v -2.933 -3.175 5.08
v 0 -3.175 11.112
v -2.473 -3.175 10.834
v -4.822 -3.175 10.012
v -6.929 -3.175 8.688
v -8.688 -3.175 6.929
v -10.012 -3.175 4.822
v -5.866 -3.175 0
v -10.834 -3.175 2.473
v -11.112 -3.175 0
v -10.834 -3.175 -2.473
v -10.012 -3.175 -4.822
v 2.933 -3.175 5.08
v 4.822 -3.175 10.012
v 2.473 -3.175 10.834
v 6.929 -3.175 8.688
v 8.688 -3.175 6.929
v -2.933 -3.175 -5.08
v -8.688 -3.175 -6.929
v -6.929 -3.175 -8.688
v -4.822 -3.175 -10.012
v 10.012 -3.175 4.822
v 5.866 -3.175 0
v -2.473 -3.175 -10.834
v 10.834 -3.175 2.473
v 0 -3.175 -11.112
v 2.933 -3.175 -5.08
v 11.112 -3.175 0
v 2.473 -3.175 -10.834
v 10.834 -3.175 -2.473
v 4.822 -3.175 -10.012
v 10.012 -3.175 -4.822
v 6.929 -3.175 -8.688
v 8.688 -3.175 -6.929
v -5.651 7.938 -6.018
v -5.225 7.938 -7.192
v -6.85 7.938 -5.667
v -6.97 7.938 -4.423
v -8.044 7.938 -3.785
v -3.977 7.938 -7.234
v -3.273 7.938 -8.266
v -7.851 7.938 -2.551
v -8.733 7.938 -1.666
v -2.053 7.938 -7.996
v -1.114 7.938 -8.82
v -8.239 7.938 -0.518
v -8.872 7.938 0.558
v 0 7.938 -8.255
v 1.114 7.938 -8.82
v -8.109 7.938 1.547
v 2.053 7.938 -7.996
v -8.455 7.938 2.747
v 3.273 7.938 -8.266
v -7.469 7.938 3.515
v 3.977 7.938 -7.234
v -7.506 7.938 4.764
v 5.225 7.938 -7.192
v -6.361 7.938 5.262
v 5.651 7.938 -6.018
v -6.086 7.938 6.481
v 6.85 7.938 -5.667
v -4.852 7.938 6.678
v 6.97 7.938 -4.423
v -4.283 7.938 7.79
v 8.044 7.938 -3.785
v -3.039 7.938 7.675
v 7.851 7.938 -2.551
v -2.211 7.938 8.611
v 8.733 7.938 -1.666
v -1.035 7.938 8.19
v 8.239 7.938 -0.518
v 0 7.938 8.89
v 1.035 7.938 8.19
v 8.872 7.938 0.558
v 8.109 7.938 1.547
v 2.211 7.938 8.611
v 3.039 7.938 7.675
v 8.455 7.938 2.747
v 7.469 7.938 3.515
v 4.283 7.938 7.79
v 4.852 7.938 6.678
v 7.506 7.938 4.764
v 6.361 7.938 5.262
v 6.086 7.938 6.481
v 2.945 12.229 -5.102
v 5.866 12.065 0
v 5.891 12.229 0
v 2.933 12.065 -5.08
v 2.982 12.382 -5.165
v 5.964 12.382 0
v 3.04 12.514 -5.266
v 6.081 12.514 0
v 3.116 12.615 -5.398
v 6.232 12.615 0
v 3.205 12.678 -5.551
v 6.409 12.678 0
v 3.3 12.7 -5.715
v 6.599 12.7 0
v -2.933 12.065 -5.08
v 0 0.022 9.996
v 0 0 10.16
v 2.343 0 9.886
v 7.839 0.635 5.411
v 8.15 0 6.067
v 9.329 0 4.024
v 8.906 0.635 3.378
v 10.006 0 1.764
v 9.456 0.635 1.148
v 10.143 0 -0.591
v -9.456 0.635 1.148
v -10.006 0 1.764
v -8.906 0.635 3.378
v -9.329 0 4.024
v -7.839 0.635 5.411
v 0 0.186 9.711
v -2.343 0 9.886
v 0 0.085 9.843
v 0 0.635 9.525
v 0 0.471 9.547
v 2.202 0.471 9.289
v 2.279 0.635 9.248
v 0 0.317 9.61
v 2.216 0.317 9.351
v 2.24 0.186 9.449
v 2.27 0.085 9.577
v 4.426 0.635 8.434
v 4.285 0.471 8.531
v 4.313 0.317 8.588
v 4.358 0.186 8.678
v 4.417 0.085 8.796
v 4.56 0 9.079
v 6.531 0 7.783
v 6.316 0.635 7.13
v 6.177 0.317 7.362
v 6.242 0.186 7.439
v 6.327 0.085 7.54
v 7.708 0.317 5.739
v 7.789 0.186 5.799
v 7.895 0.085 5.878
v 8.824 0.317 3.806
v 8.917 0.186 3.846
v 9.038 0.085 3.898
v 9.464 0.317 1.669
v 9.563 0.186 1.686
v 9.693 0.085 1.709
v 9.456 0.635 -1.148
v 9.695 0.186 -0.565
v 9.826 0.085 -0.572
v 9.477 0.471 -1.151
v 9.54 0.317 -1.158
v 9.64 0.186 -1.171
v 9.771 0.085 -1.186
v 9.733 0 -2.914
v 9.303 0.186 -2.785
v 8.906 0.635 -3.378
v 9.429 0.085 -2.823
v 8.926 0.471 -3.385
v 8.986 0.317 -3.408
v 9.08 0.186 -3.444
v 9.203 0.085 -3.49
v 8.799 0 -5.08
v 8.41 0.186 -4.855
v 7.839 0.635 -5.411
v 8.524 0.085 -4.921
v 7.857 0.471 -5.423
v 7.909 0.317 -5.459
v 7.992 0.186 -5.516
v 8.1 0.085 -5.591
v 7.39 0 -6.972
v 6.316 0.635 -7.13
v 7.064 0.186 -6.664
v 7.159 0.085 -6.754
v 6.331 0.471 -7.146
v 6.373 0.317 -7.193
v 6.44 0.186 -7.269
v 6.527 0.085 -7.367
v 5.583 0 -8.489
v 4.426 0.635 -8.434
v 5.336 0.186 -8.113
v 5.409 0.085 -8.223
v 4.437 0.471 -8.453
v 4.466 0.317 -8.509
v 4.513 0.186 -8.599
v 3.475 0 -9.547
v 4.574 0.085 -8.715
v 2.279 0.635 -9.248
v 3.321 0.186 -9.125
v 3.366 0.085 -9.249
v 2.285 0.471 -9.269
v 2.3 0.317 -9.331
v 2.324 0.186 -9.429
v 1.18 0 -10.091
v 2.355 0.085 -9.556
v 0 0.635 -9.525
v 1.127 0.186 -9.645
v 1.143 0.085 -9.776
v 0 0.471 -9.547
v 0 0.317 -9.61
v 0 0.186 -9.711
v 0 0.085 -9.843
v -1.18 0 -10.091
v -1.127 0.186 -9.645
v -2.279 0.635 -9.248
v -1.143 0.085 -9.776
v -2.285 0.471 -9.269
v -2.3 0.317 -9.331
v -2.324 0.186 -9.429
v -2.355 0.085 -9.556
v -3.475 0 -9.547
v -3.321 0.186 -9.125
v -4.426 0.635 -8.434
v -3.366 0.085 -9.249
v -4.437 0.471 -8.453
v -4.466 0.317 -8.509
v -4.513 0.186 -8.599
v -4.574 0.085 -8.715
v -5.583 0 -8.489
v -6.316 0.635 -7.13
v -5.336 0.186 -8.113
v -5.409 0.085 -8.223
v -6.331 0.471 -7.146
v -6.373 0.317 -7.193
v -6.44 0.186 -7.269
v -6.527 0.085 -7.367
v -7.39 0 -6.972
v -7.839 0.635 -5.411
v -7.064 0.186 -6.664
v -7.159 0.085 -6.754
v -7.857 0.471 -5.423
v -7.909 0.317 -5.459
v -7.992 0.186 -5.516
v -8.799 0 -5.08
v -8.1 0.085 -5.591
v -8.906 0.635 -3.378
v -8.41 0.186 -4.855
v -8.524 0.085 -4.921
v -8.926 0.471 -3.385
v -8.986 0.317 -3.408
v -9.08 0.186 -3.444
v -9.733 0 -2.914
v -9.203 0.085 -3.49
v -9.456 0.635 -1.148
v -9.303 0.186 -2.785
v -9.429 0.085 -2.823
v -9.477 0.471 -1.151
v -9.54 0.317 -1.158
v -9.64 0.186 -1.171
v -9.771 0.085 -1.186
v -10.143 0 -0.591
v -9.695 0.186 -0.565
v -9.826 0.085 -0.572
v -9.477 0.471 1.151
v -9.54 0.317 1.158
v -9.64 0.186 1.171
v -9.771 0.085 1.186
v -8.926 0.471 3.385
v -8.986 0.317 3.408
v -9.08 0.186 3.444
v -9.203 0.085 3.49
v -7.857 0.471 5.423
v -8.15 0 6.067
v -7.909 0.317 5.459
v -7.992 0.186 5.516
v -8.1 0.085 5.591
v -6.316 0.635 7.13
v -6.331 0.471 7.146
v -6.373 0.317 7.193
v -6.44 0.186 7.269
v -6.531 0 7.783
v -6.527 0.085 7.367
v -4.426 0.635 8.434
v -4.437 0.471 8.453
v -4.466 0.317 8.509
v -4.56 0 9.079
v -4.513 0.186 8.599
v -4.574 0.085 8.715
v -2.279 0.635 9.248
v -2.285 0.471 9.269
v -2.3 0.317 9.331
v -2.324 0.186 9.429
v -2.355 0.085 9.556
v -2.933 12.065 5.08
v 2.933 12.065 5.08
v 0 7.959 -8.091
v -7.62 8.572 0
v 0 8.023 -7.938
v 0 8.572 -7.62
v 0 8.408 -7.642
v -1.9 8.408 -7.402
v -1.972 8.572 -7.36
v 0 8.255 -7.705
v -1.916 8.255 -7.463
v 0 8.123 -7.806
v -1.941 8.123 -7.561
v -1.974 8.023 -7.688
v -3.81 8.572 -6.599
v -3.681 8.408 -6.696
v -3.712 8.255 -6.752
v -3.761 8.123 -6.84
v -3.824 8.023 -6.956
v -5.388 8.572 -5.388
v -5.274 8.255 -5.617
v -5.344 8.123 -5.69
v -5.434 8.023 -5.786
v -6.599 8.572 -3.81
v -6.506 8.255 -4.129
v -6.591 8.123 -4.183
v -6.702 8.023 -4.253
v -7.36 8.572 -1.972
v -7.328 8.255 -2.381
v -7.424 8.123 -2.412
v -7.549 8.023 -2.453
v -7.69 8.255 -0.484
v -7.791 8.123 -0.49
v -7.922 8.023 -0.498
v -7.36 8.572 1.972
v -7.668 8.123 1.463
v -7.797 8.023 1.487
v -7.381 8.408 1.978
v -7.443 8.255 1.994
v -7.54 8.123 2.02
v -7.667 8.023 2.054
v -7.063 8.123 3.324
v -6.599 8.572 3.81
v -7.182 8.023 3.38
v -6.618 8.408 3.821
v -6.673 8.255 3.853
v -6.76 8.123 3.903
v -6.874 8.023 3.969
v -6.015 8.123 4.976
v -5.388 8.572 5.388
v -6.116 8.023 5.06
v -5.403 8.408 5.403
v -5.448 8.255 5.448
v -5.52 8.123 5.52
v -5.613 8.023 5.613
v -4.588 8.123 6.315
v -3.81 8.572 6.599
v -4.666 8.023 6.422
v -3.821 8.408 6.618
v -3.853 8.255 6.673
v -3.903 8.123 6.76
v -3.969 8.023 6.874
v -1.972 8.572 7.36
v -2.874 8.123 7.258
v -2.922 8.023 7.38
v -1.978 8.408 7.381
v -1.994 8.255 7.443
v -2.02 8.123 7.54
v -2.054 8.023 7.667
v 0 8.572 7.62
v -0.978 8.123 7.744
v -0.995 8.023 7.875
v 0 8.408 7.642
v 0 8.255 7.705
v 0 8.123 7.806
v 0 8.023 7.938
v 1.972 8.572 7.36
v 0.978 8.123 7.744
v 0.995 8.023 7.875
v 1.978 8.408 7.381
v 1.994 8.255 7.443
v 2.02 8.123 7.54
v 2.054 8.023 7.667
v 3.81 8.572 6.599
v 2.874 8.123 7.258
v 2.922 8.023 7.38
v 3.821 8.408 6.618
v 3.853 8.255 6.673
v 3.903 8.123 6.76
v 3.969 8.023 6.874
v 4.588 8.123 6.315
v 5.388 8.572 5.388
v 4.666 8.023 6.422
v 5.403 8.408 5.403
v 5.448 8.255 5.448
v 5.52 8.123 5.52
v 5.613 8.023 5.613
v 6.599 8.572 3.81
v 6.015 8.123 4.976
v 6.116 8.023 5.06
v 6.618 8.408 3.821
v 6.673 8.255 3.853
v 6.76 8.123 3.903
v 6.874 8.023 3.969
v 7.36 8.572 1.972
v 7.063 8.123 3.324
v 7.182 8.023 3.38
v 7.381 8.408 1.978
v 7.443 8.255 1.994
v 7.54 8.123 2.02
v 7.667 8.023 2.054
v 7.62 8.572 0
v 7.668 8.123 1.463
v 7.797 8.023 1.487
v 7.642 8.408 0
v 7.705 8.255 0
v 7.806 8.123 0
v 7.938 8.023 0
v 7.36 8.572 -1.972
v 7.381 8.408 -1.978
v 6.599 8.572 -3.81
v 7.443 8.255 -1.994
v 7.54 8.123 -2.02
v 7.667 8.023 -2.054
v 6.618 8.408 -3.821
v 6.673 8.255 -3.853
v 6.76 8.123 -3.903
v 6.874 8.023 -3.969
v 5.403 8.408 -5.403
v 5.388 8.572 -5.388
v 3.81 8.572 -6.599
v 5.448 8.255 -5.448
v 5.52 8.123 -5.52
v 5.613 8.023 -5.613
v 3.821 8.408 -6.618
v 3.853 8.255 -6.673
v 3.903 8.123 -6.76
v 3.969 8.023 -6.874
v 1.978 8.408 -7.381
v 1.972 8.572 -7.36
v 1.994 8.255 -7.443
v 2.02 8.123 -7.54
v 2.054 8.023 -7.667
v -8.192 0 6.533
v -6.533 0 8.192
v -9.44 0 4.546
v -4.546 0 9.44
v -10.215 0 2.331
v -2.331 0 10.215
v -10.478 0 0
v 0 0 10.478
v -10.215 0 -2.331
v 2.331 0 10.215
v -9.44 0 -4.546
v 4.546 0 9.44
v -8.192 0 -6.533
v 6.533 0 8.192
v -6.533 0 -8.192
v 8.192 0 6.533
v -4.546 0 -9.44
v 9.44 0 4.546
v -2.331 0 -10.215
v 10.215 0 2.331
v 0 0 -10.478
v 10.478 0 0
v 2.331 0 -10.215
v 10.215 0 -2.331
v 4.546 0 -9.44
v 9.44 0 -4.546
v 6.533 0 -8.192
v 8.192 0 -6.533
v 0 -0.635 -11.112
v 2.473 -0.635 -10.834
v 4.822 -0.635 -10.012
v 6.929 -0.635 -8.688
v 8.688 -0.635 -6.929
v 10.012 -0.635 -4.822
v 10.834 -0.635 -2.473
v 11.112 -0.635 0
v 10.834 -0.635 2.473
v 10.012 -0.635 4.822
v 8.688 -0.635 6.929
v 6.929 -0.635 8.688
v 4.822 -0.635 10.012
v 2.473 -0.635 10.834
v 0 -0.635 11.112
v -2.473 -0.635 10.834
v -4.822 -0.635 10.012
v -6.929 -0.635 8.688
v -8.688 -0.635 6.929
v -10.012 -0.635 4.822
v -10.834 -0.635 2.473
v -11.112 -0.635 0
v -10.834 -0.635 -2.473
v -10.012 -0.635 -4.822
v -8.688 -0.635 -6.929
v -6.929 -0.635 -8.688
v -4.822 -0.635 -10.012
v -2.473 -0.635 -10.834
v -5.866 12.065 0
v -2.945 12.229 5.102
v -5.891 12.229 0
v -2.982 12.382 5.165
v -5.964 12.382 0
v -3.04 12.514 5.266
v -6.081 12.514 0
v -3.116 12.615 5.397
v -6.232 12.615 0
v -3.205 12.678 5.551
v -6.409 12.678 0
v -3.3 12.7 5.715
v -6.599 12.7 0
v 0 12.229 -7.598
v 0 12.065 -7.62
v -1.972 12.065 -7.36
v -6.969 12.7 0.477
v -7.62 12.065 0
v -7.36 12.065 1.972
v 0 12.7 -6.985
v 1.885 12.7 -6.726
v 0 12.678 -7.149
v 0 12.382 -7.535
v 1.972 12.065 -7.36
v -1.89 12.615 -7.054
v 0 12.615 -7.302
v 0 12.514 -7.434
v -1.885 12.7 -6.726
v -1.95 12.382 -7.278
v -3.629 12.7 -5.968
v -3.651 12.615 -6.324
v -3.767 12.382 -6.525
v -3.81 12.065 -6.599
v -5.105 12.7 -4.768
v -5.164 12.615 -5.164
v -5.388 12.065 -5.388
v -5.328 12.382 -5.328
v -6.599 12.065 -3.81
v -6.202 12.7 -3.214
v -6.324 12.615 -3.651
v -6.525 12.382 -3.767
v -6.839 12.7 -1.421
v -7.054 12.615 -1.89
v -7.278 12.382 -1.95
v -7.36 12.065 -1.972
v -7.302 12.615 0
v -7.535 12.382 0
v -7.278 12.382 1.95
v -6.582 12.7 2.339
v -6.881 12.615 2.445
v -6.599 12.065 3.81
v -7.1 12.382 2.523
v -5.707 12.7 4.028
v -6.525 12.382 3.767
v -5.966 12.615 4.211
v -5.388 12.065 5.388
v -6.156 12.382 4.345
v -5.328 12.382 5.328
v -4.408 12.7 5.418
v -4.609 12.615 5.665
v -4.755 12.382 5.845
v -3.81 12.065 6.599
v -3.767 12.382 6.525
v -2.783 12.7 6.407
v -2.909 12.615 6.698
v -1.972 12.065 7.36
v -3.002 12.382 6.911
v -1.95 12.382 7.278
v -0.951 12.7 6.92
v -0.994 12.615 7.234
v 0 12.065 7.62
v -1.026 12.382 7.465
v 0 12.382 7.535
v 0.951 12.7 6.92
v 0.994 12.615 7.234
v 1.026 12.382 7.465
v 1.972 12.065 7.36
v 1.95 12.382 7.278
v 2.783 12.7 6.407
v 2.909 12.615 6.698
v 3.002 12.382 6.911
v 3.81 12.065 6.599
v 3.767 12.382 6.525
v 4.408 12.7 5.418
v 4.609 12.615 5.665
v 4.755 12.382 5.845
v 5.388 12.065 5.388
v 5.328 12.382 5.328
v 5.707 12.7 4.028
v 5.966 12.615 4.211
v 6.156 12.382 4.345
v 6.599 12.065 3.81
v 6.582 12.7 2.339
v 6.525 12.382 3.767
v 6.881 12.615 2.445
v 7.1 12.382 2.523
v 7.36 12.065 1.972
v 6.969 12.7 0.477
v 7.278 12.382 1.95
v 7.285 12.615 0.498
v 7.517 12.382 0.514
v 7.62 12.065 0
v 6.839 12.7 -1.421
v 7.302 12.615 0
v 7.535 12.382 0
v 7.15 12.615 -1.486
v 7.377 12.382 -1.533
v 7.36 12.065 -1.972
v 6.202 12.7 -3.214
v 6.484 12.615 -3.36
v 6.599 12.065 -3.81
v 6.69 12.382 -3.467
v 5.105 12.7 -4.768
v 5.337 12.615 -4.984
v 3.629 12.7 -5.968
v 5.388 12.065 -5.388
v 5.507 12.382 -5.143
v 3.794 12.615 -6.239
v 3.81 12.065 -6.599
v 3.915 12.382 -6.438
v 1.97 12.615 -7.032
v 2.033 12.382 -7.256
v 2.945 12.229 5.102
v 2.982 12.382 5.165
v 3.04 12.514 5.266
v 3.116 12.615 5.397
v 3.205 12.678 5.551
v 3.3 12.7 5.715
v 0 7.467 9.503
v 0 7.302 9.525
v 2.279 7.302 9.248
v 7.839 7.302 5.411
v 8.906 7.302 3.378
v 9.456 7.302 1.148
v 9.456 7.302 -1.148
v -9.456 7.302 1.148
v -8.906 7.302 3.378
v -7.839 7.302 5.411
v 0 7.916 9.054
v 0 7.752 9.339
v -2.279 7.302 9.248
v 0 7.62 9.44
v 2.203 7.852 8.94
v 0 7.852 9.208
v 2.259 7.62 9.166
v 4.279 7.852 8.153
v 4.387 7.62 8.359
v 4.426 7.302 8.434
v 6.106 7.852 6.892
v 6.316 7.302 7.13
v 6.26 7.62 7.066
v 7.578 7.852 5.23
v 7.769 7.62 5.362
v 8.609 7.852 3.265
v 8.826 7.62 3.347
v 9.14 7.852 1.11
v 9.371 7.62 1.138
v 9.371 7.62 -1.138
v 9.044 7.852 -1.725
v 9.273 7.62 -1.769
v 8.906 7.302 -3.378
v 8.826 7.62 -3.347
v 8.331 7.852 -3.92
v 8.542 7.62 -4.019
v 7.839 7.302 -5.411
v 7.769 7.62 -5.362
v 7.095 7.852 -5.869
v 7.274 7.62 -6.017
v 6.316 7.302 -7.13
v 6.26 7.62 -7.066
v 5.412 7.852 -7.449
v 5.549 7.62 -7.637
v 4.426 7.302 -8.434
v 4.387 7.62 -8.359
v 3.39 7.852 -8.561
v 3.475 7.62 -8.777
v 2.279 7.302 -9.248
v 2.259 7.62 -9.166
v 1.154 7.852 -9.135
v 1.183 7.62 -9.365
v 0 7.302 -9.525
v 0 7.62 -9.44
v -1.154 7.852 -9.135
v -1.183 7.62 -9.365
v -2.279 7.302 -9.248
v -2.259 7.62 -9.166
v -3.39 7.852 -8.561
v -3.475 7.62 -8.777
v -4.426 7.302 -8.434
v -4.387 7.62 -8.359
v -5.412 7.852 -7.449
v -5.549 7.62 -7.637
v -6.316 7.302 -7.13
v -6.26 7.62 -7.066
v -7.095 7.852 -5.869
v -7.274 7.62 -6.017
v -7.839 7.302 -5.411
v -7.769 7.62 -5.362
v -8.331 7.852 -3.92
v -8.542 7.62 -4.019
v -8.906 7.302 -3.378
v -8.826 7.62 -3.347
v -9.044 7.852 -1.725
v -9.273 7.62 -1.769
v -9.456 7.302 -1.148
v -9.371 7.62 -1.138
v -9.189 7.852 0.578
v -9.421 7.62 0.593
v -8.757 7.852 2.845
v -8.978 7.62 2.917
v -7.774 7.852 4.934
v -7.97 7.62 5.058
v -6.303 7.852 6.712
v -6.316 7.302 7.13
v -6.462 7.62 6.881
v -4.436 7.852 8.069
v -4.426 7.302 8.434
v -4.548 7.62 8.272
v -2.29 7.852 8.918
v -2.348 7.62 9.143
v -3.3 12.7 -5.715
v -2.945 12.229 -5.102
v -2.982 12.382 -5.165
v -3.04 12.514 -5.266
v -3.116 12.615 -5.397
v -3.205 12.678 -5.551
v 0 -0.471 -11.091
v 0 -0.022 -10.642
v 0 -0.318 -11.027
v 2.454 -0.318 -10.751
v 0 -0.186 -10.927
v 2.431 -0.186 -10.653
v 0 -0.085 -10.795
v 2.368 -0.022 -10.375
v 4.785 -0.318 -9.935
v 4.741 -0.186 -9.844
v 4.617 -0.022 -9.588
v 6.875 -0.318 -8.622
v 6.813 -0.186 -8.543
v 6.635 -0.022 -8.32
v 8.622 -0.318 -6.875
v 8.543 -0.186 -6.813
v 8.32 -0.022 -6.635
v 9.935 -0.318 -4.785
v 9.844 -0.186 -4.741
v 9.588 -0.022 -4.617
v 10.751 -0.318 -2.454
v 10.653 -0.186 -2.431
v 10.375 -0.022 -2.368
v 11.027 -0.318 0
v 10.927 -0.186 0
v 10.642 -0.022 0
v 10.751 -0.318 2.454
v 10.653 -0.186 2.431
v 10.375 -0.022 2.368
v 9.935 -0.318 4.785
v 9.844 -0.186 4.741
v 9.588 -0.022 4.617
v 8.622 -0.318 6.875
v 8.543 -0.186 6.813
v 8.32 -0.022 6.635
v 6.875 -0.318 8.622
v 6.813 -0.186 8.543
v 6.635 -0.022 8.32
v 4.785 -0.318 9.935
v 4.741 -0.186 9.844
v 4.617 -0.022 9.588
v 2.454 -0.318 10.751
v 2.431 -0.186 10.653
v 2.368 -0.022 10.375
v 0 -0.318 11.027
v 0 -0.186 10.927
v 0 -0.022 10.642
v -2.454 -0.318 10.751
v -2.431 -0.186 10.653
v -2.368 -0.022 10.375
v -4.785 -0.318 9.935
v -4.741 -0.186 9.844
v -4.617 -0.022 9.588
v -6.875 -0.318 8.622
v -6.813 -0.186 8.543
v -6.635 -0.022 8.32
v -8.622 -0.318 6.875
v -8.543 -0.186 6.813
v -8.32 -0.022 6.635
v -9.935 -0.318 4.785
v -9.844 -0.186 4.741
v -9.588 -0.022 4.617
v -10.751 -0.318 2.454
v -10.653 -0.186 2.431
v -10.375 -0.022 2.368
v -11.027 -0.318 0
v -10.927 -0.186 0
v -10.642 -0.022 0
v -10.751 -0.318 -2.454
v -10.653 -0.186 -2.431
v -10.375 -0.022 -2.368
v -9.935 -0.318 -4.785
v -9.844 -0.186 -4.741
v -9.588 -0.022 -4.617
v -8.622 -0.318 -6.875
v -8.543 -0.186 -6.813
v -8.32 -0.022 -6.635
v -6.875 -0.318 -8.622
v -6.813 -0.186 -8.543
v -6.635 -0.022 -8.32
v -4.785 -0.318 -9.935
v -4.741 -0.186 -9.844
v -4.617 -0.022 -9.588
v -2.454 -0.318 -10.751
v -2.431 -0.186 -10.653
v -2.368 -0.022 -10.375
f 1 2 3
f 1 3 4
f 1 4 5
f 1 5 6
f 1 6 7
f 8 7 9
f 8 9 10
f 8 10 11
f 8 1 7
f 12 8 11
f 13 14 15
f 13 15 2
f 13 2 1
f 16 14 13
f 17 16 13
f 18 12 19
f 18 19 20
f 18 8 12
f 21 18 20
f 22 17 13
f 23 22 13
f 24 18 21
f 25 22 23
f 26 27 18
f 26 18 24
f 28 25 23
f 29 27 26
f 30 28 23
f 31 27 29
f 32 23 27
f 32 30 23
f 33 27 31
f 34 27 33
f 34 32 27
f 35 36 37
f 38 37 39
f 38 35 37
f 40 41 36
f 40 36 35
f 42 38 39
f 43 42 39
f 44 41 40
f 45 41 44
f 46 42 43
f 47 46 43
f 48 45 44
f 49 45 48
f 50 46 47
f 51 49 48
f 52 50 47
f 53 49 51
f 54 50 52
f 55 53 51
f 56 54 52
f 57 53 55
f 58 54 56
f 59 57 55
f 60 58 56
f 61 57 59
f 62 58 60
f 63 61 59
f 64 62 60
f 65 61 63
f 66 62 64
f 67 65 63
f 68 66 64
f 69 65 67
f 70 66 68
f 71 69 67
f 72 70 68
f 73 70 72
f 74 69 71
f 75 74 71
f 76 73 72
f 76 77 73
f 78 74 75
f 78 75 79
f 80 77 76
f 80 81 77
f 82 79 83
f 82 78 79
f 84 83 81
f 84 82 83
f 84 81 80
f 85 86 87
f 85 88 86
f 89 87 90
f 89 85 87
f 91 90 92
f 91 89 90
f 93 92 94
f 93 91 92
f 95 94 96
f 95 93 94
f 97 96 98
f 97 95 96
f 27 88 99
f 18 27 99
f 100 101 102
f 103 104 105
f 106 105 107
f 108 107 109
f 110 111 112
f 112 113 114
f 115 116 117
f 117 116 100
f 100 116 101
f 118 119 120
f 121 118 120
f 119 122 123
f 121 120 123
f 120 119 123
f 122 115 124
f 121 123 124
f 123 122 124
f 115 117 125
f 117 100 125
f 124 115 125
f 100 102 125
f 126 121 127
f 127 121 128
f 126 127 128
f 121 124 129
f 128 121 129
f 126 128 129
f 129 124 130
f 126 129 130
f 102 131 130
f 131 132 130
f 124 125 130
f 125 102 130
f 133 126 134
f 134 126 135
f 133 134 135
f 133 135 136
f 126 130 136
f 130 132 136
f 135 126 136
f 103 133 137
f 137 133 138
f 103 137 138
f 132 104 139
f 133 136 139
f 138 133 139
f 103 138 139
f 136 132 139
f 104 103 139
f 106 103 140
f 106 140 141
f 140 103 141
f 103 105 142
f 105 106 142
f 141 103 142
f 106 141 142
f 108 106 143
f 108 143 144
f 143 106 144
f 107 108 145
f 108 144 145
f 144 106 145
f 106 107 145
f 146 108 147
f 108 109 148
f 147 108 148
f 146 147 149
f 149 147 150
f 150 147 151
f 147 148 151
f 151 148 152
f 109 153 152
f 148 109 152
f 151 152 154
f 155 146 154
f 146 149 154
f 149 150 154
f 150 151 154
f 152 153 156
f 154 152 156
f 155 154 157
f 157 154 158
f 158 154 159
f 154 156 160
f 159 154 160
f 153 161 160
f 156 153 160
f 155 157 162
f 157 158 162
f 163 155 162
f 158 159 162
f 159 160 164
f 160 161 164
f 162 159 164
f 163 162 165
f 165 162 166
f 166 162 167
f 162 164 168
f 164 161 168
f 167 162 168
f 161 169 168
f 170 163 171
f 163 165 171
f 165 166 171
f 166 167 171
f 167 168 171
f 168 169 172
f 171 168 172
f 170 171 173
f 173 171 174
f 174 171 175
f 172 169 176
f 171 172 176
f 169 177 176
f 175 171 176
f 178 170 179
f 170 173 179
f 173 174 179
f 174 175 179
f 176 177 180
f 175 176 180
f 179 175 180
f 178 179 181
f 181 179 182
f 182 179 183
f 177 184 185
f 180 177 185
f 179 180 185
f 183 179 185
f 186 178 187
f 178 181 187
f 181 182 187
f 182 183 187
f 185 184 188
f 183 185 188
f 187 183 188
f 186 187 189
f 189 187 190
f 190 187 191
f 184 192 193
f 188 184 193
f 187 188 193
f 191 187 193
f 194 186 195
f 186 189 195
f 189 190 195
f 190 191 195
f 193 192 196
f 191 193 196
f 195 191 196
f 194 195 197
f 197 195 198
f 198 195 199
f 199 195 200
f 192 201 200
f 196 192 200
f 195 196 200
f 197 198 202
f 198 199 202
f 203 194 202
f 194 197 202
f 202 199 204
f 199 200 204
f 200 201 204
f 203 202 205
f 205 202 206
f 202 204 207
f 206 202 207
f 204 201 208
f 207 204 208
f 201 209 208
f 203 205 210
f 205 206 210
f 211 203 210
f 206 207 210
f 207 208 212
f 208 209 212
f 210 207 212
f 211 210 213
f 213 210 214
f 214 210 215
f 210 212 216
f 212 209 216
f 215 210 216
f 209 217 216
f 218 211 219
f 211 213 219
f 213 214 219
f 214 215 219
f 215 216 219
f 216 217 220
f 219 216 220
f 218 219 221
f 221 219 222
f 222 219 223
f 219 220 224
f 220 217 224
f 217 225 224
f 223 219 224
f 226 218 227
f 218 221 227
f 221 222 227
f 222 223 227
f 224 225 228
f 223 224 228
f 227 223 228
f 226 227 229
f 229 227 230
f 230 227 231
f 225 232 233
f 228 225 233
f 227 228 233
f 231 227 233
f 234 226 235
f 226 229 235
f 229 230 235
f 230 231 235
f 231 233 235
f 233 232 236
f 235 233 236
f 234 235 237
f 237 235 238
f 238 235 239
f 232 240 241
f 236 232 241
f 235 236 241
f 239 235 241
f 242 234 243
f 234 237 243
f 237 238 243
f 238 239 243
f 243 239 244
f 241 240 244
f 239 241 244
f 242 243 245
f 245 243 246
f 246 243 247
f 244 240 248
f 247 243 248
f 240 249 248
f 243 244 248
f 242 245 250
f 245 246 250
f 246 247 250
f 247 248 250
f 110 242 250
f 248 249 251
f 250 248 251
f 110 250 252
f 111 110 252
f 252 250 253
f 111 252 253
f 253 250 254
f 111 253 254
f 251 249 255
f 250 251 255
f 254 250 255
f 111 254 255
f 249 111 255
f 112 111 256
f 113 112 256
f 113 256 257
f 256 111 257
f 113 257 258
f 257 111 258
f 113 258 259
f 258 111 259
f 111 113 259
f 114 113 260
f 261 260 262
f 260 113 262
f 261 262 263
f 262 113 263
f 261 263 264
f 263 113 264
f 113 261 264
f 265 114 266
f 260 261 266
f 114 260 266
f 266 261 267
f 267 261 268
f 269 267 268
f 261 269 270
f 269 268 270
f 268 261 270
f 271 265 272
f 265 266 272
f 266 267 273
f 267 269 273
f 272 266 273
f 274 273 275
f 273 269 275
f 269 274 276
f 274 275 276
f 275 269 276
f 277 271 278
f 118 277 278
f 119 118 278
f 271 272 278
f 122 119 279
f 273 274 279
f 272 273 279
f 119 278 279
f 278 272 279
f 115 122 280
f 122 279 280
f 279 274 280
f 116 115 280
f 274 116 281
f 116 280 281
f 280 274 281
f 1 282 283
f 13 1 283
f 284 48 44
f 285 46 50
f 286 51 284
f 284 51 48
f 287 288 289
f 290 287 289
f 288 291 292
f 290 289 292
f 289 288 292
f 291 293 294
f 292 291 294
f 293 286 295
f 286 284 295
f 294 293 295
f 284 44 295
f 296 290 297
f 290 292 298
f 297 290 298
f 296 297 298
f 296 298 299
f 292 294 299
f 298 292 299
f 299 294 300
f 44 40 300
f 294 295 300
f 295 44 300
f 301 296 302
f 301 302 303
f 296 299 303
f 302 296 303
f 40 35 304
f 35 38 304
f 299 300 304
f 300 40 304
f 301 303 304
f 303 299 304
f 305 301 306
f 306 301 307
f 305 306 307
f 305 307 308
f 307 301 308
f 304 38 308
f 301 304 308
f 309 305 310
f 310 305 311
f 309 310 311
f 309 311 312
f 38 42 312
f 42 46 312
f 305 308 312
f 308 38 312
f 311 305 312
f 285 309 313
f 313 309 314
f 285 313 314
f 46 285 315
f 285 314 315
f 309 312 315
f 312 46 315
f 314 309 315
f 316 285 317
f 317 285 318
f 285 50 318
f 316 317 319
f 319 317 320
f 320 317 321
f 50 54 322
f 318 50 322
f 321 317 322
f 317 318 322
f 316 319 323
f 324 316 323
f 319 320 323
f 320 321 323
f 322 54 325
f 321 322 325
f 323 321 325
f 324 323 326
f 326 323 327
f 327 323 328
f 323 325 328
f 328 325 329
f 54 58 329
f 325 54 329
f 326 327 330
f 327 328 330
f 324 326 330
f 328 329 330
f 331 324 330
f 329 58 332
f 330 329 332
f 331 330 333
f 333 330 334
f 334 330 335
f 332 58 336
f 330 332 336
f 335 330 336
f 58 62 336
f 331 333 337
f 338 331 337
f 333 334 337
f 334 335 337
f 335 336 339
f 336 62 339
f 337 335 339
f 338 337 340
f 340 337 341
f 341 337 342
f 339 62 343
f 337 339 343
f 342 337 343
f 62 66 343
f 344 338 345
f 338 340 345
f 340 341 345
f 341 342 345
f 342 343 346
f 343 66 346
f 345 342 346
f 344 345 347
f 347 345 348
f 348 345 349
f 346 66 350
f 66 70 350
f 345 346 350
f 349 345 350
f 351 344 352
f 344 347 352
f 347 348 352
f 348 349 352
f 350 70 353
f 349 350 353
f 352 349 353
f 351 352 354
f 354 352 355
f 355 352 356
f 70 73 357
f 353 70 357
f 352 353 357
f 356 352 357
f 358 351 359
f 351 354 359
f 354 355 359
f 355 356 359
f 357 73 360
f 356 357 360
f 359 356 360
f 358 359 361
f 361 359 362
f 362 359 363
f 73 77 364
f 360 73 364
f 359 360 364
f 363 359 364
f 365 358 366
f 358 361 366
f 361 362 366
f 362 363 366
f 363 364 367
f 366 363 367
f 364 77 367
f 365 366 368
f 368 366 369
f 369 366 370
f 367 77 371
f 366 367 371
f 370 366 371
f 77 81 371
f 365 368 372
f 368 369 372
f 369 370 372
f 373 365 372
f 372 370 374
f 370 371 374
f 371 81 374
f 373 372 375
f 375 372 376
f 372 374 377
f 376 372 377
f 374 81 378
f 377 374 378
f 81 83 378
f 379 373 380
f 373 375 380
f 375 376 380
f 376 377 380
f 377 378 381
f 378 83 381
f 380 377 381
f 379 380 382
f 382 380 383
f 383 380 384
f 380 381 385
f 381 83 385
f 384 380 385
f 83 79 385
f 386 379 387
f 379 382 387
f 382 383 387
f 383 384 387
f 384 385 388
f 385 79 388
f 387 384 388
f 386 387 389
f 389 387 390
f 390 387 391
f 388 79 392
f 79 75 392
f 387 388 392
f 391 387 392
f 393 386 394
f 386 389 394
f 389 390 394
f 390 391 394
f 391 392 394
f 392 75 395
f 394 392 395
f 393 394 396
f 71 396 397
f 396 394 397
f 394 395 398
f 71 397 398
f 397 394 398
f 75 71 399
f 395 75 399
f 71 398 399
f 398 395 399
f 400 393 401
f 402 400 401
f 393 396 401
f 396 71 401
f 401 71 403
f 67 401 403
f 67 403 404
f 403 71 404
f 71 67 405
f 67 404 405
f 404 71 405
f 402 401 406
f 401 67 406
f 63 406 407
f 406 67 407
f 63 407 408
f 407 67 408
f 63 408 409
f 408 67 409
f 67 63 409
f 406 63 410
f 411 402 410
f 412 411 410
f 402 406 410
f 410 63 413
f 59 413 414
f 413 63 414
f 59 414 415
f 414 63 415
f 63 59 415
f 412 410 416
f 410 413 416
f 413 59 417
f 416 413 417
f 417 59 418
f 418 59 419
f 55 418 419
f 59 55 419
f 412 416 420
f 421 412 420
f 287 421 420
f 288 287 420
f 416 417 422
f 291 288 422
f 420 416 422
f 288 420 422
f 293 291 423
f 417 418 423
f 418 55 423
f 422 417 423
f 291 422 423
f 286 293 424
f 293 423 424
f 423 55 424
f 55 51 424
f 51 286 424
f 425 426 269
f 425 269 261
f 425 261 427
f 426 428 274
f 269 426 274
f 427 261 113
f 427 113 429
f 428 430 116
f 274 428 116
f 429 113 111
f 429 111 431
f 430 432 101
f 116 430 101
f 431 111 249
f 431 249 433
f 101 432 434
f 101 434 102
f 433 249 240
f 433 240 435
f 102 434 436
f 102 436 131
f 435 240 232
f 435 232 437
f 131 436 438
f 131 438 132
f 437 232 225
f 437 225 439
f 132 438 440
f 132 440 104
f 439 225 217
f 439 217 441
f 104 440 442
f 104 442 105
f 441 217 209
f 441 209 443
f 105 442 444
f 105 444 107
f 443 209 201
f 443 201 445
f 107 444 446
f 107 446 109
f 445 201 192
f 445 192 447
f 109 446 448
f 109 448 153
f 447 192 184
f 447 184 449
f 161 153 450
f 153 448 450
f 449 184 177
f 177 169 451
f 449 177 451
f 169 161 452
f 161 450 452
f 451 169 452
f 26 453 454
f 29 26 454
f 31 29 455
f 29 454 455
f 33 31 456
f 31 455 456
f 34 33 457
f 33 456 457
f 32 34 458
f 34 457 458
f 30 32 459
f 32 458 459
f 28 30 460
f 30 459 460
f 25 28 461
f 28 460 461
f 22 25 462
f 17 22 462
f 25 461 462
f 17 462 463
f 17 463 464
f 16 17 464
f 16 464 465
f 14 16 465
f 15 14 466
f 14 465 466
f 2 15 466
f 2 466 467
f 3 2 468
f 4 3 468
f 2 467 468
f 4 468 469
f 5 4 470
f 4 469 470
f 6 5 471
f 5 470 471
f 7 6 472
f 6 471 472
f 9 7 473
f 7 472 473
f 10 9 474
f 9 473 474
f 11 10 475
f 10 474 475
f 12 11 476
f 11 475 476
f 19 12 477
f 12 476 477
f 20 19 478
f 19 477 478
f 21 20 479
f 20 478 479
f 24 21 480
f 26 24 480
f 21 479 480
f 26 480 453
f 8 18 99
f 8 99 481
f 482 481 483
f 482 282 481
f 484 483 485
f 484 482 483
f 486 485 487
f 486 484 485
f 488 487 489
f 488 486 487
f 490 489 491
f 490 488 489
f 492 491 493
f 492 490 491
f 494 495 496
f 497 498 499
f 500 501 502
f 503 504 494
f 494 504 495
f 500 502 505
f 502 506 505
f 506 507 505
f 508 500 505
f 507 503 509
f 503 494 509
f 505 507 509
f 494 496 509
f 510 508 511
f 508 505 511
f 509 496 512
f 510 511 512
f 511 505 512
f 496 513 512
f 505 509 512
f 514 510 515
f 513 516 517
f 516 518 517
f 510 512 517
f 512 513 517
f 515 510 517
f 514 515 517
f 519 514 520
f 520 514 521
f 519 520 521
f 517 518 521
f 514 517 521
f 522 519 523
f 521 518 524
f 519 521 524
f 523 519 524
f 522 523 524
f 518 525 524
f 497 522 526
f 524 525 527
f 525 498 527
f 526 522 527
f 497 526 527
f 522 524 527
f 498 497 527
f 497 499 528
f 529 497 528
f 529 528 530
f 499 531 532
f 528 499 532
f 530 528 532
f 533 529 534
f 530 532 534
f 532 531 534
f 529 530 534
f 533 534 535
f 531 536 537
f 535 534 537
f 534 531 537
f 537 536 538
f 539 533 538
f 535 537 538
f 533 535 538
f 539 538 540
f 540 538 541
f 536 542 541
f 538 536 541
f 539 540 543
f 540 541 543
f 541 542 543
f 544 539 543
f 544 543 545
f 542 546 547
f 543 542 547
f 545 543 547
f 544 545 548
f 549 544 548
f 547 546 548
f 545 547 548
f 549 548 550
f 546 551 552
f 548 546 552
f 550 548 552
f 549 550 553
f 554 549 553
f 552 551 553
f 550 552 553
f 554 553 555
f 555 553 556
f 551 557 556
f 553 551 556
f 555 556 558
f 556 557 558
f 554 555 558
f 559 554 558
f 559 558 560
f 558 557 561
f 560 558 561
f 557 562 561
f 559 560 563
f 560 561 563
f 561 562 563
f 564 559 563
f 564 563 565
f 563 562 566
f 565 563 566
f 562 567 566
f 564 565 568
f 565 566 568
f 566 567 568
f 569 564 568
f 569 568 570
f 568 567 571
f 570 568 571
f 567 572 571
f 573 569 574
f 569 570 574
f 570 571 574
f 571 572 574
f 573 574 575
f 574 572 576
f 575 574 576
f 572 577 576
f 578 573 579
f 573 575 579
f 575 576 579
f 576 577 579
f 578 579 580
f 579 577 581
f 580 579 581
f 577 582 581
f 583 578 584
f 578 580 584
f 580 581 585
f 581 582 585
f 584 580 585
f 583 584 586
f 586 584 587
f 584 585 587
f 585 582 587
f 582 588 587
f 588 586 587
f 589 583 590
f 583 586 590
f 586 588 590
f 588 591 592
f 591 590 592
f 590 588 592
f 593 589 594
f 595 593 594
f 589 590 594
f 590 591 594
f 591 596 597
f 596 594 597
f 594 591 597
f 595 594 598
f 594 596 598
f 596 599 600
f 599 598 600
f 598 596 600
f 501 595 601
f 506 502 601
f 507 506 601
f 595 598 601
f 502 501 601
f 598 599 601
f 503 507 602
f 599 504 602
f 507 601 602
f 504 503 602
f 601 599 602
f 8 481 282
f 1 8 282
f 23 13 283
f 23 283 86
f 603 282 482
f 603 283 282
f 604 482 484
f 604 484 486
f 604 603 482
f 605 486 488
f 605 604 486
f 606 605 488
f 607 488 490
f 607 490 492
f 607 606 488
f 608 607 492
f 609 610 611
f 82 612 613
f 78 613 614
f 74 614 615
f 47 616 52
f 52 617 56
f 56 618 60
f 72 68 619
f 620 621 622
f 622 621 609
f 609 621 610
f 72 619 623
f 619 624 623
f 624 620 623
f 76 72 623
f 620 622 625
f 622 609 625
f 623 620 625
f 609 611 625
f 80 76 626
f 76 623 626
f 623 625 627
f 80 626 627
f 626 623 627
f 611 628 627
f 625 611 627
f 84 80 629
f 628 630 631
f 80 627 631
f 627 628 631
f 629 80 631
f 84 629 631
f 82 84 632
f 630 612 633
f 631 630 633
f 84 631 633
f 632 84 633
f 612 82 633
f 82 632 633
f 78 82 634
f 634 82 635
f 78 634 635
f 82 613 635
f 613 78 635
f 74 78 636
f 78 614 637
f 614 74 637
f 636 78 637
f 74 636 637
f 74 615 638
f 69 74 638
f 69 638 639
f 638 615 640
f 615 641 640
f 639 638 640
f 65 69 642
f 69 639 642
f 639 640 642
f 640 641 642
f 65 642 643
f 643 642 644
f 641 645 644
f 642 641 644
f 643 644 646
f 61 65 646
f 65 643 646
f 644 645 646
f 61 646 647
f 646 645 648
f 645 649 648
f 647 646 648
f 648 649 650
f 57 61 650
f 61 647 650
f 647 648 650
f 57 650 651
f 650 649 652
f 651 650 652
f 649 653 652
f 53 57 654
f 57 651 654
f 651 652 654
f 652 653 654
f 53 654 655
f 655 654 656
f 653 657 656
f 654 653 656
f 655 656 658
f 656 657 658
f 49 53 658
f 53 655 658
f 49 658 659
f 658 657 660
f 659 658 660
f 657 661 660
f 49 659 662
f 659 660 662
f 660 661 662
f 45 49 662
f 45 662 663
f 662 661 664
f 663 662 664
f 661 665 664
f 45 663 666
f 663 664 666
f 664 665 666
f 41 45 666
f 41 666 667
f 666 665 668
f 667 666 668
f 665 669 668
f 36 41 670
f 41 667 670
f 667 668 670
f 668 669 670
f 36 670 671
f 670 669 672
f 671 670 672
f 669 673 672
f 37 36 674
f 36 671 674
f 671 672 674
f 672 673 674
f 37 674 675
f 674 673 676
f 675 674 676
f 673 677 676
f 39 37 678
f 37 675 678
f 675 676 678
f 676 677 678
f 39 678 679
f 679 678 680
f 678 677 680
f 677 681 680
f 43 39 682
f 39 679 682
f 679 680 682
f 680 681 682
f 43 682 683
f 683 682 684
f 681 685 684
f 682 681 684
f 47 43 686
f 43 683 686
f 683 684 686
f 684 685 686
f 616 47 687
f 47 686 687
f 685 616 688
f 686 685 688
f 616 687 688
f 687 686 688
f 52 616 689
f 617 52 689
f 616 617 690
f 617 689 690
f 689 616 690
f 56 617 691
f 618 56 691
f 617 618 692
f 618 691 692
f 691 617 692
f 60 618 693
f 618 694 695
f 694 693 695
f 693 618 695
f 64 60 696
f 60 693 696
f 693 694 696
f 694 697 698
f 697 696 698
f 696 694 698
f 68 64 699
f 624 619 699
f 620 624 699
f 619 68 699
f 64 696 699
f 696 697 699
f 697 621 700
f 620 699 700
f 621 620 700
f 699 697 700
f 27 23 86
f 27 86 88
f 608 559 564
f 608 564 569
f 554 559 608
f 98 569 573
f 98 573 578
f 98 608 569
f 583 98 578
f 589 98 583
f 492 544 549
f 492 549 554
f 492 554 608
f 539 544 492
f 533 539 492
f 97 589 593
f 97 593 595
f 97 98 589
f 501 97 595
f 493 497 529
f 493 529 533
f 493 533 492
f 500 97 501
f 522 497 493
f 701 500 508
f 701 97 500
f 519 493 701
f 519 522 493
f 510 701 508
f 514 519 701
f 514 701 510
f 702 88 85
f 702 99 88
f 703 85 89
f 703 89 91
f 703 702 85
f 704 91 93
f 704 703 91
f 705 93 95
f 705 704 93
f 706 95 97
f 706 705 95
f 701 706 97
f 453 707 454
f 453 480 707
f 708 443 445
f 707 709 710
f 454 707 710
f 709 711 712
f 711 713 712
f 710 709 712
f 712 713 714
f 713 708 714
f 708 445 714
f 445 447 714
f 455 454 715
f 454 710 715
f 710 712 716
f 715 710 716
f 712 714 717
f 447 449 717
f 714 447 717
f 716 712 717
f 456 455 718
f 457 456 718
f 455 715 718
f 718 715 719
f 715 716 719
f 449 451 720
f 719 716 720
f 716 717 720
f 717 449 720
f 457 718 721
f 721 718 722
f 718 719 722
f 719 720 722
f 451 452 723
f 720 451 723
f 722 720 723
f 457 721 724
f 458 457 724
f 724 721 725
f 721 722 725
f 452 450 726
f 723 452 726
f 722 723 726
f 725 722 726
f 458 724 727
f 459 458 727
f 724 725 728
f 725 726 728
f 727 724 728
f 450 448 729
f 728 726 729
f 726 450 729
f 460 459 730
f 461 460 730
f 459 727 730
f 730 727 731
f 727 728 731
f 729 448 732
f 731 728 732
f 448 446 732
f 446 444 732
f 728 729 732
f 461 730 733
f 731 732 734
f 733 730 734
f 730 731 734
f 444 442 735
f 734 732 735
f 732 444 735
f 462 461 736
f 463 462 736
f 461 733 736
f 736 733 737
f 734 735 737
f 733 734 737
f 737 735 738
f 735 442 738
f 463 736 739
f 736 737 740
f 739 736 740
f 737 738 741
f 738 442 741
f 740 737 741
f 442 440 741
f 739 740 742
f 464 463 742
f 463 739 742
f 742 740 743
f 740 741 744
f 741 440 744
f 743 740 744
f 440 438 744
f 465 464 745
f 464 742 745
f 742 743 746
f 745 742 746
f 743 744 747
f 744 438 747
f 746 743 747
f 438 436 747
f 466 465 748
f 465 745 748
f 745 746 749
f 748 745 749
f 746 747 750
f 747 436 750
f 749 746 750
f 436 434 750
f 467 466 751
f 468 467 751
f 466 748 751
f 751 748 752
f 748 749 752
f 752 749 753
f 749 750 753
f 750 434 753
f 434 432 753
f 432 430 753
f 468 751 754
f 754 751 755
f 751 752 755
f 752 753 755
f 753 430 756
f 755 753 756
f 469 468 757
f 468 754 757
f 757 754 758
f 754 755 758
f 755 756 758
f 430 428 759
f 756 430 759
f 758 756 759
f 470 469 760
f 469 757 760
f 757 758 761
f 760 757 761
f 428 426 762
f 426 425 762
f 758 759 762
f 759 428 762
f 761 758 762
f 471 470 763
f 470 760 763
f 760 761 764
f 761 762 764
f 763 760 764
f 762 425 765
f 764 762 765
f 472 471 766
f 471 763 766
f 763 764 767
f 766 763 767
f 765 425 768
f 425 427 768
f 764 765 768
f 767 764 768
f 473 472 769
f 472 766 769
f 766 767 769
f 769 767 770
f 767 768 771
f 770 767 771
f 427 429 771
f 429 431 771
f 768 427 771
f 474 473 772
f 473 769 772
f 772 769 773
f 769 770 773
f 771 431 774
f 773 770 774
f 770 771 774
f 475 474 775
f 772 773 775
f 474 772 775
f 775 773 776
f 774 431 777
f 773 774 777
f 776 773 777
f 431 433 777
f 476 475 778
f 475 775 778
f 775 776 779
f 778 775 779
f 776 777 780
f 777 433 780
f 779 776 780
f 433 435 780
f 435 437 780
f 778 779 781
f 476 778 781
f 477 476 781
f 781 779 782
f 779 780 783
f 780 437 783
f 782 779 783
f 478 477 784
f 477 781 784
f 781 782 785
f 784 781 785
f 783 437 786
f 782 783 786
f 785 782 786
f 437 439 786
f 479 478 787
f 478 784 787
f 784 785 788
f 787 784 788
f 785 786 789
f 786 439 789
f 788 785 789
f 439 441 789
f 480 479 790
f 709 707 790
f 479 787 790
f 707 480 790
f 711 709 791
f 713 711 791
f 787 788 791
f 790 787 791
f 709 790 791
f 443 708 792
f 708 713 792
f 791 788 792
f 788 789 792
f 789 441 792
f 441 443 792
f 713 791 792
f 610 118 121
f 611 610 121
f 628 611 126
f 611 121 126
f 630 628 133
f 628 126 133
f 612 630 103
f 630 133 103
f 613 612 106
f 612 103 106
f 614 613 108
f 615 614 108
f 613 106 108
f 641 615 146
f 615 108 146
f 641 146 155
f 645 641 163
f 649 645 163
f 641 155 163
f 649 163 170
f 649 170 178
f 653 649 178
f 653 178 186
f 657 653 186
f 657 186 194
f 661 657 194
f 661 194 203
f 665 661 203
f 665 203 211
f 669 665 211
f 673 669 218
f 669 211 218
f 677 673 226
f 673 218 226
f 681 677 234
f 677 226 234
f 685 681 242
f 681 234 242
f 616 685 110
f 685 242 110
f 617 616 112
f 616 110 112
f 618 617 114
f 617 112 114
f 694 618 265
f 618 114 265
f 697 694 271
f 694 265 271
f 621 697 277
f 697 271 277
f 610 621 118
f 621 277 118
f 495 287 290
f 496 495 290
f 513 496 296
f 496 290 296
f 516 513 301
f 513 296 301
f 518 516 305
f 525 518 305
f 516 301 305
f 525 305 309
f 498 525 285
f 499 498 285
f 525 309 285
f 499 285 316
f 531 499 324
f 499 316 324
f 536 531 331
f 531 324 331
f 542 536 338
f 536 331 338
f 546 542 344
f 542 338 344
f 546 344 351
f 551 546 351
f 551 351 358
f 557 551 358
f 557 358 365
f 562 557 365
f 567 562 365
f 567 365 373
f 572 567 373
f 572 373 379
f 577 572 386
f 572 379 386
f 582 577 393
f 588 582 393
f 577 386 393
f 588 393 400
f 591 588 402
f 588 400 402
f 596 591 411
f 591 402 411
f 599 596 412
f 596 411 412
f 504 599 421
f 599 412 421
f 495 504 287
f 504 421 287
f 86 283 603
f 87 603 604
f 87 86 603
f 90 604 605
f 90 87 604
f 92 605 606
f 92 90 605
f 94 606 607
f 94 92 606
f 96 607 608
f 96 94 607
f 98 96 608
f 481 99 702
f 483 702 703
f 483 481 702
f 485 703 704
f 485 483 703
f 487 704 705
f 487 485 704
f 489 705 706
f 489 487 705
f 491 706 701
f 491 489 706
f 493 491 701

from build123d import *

# Parameters (mm, degrees)
SKETCH1_R           = 9.525
BOSS_EXTRUDE1_DEPTH = 7.9375
SKETCH2_R           = 7.62
BOSS_EXTRUDE2_DEPTH = 4.7625
SKETCH3_R           = 11.1125
BOSS_EXTRUDE3_DEPTH = 3.175
FILLET1_R           = 0.635
FILLET3_R           = 0.635
FILLET4_R           = 0.635


with BuildPart() as part:
    # Sketch1 → Boss-Extrude1 (new body)
    with BuildSketch(Plane(origin=(0, 0, 0), x_dir=(1, 0, 0), z_dir=(0, 1, 0))):
        with Locations(Location((0, 0, 0), (0, 0, 270))):
            Circle(SKETCH1_R)
        Polygon((5.865878735, 0), (2.932939367, 5.08), (-2.932939367, 5.08), (-5.865878735, 0), (-2.932939367, -5.08), (2.932939367, -5.08), align=None, mode=Mode.SUBTRACT)
    extrude(amount=BOSS_EXTRUDE1_DEPTH)

    # Sketch2 → Boss-Extrude2 (add)
    with BuildSketch(Plane(origin=(0, 7.9375, 0), x_dir=(1, 0, 0), z_dir=(0, 1, 0))):
        with Locations(Location((0, 0, 0), (0, 0, 90))):
            Circle(SKETCH2_R)
        Polygon((-2.932939367, 5.08), (-5.865878735, 0), (-2.932939367, -5.08), (2.932939367, -5.08), (5.865878735, 0), (2.932939367, 5.08), align=None, mode=Mode.SUBTRACT)
    extrude(amount=BOSS_EXTRUDE2_DEPTH)

    # Sketch3 → Boss-Extrude3 (add)
    with BuildSketch(Plane.XZ):
        with Locations(Location((0, 0, 0), (0, 0, 270))):
            Circle(SKETCH3_R)
        Polygon((-2.932939367, 5.08), (2.932939367, 5.08), (5.865878735, 0), (2.932939367, -5.08), (-2.932939367, -5.08), (-5.865878735, 0), align=None, mode=Mode.SUBTRACT)
    extrude(amount=BOSS_EXTRUDE3_DEPTH)

    # Fillet1
    fillet1_edges = [part.edges().sort_by_distance(p)[0] for p in [
        (0, 0, -9.525),
        (0, 0, 11.1125),
    ]]
    fillet(fillet1_edges, radius=FILLET1_R)

    # Fillet3
    fillet3_edges = [part.edges().sort_by_distance(p)[0] for p in [
        (0, 12.7, -5.08),
        (-4.399409051, 12.7, -2.54),
        (-4.399409051, 12.7, 2.54),
        (0, 12.7, 5.08),
        (4.399409051, 12.7, 2.54),
        (4.399409051, 12.7, -2.54),
    ]]
    fillet(fillet3_edges, radius=FILLET3_R)

    # Fillet4
    fillet4_edges = [part.edges().sort_by_distance(p)[0] for p in [
        (0, 12.7, 7.62),
        (0, 7.9375, 7.62),
        (0, 7.9375, -9.525),
    ]]
    fillet(fillet4_edges, radius=FILLET4_R)


solid = part.part
